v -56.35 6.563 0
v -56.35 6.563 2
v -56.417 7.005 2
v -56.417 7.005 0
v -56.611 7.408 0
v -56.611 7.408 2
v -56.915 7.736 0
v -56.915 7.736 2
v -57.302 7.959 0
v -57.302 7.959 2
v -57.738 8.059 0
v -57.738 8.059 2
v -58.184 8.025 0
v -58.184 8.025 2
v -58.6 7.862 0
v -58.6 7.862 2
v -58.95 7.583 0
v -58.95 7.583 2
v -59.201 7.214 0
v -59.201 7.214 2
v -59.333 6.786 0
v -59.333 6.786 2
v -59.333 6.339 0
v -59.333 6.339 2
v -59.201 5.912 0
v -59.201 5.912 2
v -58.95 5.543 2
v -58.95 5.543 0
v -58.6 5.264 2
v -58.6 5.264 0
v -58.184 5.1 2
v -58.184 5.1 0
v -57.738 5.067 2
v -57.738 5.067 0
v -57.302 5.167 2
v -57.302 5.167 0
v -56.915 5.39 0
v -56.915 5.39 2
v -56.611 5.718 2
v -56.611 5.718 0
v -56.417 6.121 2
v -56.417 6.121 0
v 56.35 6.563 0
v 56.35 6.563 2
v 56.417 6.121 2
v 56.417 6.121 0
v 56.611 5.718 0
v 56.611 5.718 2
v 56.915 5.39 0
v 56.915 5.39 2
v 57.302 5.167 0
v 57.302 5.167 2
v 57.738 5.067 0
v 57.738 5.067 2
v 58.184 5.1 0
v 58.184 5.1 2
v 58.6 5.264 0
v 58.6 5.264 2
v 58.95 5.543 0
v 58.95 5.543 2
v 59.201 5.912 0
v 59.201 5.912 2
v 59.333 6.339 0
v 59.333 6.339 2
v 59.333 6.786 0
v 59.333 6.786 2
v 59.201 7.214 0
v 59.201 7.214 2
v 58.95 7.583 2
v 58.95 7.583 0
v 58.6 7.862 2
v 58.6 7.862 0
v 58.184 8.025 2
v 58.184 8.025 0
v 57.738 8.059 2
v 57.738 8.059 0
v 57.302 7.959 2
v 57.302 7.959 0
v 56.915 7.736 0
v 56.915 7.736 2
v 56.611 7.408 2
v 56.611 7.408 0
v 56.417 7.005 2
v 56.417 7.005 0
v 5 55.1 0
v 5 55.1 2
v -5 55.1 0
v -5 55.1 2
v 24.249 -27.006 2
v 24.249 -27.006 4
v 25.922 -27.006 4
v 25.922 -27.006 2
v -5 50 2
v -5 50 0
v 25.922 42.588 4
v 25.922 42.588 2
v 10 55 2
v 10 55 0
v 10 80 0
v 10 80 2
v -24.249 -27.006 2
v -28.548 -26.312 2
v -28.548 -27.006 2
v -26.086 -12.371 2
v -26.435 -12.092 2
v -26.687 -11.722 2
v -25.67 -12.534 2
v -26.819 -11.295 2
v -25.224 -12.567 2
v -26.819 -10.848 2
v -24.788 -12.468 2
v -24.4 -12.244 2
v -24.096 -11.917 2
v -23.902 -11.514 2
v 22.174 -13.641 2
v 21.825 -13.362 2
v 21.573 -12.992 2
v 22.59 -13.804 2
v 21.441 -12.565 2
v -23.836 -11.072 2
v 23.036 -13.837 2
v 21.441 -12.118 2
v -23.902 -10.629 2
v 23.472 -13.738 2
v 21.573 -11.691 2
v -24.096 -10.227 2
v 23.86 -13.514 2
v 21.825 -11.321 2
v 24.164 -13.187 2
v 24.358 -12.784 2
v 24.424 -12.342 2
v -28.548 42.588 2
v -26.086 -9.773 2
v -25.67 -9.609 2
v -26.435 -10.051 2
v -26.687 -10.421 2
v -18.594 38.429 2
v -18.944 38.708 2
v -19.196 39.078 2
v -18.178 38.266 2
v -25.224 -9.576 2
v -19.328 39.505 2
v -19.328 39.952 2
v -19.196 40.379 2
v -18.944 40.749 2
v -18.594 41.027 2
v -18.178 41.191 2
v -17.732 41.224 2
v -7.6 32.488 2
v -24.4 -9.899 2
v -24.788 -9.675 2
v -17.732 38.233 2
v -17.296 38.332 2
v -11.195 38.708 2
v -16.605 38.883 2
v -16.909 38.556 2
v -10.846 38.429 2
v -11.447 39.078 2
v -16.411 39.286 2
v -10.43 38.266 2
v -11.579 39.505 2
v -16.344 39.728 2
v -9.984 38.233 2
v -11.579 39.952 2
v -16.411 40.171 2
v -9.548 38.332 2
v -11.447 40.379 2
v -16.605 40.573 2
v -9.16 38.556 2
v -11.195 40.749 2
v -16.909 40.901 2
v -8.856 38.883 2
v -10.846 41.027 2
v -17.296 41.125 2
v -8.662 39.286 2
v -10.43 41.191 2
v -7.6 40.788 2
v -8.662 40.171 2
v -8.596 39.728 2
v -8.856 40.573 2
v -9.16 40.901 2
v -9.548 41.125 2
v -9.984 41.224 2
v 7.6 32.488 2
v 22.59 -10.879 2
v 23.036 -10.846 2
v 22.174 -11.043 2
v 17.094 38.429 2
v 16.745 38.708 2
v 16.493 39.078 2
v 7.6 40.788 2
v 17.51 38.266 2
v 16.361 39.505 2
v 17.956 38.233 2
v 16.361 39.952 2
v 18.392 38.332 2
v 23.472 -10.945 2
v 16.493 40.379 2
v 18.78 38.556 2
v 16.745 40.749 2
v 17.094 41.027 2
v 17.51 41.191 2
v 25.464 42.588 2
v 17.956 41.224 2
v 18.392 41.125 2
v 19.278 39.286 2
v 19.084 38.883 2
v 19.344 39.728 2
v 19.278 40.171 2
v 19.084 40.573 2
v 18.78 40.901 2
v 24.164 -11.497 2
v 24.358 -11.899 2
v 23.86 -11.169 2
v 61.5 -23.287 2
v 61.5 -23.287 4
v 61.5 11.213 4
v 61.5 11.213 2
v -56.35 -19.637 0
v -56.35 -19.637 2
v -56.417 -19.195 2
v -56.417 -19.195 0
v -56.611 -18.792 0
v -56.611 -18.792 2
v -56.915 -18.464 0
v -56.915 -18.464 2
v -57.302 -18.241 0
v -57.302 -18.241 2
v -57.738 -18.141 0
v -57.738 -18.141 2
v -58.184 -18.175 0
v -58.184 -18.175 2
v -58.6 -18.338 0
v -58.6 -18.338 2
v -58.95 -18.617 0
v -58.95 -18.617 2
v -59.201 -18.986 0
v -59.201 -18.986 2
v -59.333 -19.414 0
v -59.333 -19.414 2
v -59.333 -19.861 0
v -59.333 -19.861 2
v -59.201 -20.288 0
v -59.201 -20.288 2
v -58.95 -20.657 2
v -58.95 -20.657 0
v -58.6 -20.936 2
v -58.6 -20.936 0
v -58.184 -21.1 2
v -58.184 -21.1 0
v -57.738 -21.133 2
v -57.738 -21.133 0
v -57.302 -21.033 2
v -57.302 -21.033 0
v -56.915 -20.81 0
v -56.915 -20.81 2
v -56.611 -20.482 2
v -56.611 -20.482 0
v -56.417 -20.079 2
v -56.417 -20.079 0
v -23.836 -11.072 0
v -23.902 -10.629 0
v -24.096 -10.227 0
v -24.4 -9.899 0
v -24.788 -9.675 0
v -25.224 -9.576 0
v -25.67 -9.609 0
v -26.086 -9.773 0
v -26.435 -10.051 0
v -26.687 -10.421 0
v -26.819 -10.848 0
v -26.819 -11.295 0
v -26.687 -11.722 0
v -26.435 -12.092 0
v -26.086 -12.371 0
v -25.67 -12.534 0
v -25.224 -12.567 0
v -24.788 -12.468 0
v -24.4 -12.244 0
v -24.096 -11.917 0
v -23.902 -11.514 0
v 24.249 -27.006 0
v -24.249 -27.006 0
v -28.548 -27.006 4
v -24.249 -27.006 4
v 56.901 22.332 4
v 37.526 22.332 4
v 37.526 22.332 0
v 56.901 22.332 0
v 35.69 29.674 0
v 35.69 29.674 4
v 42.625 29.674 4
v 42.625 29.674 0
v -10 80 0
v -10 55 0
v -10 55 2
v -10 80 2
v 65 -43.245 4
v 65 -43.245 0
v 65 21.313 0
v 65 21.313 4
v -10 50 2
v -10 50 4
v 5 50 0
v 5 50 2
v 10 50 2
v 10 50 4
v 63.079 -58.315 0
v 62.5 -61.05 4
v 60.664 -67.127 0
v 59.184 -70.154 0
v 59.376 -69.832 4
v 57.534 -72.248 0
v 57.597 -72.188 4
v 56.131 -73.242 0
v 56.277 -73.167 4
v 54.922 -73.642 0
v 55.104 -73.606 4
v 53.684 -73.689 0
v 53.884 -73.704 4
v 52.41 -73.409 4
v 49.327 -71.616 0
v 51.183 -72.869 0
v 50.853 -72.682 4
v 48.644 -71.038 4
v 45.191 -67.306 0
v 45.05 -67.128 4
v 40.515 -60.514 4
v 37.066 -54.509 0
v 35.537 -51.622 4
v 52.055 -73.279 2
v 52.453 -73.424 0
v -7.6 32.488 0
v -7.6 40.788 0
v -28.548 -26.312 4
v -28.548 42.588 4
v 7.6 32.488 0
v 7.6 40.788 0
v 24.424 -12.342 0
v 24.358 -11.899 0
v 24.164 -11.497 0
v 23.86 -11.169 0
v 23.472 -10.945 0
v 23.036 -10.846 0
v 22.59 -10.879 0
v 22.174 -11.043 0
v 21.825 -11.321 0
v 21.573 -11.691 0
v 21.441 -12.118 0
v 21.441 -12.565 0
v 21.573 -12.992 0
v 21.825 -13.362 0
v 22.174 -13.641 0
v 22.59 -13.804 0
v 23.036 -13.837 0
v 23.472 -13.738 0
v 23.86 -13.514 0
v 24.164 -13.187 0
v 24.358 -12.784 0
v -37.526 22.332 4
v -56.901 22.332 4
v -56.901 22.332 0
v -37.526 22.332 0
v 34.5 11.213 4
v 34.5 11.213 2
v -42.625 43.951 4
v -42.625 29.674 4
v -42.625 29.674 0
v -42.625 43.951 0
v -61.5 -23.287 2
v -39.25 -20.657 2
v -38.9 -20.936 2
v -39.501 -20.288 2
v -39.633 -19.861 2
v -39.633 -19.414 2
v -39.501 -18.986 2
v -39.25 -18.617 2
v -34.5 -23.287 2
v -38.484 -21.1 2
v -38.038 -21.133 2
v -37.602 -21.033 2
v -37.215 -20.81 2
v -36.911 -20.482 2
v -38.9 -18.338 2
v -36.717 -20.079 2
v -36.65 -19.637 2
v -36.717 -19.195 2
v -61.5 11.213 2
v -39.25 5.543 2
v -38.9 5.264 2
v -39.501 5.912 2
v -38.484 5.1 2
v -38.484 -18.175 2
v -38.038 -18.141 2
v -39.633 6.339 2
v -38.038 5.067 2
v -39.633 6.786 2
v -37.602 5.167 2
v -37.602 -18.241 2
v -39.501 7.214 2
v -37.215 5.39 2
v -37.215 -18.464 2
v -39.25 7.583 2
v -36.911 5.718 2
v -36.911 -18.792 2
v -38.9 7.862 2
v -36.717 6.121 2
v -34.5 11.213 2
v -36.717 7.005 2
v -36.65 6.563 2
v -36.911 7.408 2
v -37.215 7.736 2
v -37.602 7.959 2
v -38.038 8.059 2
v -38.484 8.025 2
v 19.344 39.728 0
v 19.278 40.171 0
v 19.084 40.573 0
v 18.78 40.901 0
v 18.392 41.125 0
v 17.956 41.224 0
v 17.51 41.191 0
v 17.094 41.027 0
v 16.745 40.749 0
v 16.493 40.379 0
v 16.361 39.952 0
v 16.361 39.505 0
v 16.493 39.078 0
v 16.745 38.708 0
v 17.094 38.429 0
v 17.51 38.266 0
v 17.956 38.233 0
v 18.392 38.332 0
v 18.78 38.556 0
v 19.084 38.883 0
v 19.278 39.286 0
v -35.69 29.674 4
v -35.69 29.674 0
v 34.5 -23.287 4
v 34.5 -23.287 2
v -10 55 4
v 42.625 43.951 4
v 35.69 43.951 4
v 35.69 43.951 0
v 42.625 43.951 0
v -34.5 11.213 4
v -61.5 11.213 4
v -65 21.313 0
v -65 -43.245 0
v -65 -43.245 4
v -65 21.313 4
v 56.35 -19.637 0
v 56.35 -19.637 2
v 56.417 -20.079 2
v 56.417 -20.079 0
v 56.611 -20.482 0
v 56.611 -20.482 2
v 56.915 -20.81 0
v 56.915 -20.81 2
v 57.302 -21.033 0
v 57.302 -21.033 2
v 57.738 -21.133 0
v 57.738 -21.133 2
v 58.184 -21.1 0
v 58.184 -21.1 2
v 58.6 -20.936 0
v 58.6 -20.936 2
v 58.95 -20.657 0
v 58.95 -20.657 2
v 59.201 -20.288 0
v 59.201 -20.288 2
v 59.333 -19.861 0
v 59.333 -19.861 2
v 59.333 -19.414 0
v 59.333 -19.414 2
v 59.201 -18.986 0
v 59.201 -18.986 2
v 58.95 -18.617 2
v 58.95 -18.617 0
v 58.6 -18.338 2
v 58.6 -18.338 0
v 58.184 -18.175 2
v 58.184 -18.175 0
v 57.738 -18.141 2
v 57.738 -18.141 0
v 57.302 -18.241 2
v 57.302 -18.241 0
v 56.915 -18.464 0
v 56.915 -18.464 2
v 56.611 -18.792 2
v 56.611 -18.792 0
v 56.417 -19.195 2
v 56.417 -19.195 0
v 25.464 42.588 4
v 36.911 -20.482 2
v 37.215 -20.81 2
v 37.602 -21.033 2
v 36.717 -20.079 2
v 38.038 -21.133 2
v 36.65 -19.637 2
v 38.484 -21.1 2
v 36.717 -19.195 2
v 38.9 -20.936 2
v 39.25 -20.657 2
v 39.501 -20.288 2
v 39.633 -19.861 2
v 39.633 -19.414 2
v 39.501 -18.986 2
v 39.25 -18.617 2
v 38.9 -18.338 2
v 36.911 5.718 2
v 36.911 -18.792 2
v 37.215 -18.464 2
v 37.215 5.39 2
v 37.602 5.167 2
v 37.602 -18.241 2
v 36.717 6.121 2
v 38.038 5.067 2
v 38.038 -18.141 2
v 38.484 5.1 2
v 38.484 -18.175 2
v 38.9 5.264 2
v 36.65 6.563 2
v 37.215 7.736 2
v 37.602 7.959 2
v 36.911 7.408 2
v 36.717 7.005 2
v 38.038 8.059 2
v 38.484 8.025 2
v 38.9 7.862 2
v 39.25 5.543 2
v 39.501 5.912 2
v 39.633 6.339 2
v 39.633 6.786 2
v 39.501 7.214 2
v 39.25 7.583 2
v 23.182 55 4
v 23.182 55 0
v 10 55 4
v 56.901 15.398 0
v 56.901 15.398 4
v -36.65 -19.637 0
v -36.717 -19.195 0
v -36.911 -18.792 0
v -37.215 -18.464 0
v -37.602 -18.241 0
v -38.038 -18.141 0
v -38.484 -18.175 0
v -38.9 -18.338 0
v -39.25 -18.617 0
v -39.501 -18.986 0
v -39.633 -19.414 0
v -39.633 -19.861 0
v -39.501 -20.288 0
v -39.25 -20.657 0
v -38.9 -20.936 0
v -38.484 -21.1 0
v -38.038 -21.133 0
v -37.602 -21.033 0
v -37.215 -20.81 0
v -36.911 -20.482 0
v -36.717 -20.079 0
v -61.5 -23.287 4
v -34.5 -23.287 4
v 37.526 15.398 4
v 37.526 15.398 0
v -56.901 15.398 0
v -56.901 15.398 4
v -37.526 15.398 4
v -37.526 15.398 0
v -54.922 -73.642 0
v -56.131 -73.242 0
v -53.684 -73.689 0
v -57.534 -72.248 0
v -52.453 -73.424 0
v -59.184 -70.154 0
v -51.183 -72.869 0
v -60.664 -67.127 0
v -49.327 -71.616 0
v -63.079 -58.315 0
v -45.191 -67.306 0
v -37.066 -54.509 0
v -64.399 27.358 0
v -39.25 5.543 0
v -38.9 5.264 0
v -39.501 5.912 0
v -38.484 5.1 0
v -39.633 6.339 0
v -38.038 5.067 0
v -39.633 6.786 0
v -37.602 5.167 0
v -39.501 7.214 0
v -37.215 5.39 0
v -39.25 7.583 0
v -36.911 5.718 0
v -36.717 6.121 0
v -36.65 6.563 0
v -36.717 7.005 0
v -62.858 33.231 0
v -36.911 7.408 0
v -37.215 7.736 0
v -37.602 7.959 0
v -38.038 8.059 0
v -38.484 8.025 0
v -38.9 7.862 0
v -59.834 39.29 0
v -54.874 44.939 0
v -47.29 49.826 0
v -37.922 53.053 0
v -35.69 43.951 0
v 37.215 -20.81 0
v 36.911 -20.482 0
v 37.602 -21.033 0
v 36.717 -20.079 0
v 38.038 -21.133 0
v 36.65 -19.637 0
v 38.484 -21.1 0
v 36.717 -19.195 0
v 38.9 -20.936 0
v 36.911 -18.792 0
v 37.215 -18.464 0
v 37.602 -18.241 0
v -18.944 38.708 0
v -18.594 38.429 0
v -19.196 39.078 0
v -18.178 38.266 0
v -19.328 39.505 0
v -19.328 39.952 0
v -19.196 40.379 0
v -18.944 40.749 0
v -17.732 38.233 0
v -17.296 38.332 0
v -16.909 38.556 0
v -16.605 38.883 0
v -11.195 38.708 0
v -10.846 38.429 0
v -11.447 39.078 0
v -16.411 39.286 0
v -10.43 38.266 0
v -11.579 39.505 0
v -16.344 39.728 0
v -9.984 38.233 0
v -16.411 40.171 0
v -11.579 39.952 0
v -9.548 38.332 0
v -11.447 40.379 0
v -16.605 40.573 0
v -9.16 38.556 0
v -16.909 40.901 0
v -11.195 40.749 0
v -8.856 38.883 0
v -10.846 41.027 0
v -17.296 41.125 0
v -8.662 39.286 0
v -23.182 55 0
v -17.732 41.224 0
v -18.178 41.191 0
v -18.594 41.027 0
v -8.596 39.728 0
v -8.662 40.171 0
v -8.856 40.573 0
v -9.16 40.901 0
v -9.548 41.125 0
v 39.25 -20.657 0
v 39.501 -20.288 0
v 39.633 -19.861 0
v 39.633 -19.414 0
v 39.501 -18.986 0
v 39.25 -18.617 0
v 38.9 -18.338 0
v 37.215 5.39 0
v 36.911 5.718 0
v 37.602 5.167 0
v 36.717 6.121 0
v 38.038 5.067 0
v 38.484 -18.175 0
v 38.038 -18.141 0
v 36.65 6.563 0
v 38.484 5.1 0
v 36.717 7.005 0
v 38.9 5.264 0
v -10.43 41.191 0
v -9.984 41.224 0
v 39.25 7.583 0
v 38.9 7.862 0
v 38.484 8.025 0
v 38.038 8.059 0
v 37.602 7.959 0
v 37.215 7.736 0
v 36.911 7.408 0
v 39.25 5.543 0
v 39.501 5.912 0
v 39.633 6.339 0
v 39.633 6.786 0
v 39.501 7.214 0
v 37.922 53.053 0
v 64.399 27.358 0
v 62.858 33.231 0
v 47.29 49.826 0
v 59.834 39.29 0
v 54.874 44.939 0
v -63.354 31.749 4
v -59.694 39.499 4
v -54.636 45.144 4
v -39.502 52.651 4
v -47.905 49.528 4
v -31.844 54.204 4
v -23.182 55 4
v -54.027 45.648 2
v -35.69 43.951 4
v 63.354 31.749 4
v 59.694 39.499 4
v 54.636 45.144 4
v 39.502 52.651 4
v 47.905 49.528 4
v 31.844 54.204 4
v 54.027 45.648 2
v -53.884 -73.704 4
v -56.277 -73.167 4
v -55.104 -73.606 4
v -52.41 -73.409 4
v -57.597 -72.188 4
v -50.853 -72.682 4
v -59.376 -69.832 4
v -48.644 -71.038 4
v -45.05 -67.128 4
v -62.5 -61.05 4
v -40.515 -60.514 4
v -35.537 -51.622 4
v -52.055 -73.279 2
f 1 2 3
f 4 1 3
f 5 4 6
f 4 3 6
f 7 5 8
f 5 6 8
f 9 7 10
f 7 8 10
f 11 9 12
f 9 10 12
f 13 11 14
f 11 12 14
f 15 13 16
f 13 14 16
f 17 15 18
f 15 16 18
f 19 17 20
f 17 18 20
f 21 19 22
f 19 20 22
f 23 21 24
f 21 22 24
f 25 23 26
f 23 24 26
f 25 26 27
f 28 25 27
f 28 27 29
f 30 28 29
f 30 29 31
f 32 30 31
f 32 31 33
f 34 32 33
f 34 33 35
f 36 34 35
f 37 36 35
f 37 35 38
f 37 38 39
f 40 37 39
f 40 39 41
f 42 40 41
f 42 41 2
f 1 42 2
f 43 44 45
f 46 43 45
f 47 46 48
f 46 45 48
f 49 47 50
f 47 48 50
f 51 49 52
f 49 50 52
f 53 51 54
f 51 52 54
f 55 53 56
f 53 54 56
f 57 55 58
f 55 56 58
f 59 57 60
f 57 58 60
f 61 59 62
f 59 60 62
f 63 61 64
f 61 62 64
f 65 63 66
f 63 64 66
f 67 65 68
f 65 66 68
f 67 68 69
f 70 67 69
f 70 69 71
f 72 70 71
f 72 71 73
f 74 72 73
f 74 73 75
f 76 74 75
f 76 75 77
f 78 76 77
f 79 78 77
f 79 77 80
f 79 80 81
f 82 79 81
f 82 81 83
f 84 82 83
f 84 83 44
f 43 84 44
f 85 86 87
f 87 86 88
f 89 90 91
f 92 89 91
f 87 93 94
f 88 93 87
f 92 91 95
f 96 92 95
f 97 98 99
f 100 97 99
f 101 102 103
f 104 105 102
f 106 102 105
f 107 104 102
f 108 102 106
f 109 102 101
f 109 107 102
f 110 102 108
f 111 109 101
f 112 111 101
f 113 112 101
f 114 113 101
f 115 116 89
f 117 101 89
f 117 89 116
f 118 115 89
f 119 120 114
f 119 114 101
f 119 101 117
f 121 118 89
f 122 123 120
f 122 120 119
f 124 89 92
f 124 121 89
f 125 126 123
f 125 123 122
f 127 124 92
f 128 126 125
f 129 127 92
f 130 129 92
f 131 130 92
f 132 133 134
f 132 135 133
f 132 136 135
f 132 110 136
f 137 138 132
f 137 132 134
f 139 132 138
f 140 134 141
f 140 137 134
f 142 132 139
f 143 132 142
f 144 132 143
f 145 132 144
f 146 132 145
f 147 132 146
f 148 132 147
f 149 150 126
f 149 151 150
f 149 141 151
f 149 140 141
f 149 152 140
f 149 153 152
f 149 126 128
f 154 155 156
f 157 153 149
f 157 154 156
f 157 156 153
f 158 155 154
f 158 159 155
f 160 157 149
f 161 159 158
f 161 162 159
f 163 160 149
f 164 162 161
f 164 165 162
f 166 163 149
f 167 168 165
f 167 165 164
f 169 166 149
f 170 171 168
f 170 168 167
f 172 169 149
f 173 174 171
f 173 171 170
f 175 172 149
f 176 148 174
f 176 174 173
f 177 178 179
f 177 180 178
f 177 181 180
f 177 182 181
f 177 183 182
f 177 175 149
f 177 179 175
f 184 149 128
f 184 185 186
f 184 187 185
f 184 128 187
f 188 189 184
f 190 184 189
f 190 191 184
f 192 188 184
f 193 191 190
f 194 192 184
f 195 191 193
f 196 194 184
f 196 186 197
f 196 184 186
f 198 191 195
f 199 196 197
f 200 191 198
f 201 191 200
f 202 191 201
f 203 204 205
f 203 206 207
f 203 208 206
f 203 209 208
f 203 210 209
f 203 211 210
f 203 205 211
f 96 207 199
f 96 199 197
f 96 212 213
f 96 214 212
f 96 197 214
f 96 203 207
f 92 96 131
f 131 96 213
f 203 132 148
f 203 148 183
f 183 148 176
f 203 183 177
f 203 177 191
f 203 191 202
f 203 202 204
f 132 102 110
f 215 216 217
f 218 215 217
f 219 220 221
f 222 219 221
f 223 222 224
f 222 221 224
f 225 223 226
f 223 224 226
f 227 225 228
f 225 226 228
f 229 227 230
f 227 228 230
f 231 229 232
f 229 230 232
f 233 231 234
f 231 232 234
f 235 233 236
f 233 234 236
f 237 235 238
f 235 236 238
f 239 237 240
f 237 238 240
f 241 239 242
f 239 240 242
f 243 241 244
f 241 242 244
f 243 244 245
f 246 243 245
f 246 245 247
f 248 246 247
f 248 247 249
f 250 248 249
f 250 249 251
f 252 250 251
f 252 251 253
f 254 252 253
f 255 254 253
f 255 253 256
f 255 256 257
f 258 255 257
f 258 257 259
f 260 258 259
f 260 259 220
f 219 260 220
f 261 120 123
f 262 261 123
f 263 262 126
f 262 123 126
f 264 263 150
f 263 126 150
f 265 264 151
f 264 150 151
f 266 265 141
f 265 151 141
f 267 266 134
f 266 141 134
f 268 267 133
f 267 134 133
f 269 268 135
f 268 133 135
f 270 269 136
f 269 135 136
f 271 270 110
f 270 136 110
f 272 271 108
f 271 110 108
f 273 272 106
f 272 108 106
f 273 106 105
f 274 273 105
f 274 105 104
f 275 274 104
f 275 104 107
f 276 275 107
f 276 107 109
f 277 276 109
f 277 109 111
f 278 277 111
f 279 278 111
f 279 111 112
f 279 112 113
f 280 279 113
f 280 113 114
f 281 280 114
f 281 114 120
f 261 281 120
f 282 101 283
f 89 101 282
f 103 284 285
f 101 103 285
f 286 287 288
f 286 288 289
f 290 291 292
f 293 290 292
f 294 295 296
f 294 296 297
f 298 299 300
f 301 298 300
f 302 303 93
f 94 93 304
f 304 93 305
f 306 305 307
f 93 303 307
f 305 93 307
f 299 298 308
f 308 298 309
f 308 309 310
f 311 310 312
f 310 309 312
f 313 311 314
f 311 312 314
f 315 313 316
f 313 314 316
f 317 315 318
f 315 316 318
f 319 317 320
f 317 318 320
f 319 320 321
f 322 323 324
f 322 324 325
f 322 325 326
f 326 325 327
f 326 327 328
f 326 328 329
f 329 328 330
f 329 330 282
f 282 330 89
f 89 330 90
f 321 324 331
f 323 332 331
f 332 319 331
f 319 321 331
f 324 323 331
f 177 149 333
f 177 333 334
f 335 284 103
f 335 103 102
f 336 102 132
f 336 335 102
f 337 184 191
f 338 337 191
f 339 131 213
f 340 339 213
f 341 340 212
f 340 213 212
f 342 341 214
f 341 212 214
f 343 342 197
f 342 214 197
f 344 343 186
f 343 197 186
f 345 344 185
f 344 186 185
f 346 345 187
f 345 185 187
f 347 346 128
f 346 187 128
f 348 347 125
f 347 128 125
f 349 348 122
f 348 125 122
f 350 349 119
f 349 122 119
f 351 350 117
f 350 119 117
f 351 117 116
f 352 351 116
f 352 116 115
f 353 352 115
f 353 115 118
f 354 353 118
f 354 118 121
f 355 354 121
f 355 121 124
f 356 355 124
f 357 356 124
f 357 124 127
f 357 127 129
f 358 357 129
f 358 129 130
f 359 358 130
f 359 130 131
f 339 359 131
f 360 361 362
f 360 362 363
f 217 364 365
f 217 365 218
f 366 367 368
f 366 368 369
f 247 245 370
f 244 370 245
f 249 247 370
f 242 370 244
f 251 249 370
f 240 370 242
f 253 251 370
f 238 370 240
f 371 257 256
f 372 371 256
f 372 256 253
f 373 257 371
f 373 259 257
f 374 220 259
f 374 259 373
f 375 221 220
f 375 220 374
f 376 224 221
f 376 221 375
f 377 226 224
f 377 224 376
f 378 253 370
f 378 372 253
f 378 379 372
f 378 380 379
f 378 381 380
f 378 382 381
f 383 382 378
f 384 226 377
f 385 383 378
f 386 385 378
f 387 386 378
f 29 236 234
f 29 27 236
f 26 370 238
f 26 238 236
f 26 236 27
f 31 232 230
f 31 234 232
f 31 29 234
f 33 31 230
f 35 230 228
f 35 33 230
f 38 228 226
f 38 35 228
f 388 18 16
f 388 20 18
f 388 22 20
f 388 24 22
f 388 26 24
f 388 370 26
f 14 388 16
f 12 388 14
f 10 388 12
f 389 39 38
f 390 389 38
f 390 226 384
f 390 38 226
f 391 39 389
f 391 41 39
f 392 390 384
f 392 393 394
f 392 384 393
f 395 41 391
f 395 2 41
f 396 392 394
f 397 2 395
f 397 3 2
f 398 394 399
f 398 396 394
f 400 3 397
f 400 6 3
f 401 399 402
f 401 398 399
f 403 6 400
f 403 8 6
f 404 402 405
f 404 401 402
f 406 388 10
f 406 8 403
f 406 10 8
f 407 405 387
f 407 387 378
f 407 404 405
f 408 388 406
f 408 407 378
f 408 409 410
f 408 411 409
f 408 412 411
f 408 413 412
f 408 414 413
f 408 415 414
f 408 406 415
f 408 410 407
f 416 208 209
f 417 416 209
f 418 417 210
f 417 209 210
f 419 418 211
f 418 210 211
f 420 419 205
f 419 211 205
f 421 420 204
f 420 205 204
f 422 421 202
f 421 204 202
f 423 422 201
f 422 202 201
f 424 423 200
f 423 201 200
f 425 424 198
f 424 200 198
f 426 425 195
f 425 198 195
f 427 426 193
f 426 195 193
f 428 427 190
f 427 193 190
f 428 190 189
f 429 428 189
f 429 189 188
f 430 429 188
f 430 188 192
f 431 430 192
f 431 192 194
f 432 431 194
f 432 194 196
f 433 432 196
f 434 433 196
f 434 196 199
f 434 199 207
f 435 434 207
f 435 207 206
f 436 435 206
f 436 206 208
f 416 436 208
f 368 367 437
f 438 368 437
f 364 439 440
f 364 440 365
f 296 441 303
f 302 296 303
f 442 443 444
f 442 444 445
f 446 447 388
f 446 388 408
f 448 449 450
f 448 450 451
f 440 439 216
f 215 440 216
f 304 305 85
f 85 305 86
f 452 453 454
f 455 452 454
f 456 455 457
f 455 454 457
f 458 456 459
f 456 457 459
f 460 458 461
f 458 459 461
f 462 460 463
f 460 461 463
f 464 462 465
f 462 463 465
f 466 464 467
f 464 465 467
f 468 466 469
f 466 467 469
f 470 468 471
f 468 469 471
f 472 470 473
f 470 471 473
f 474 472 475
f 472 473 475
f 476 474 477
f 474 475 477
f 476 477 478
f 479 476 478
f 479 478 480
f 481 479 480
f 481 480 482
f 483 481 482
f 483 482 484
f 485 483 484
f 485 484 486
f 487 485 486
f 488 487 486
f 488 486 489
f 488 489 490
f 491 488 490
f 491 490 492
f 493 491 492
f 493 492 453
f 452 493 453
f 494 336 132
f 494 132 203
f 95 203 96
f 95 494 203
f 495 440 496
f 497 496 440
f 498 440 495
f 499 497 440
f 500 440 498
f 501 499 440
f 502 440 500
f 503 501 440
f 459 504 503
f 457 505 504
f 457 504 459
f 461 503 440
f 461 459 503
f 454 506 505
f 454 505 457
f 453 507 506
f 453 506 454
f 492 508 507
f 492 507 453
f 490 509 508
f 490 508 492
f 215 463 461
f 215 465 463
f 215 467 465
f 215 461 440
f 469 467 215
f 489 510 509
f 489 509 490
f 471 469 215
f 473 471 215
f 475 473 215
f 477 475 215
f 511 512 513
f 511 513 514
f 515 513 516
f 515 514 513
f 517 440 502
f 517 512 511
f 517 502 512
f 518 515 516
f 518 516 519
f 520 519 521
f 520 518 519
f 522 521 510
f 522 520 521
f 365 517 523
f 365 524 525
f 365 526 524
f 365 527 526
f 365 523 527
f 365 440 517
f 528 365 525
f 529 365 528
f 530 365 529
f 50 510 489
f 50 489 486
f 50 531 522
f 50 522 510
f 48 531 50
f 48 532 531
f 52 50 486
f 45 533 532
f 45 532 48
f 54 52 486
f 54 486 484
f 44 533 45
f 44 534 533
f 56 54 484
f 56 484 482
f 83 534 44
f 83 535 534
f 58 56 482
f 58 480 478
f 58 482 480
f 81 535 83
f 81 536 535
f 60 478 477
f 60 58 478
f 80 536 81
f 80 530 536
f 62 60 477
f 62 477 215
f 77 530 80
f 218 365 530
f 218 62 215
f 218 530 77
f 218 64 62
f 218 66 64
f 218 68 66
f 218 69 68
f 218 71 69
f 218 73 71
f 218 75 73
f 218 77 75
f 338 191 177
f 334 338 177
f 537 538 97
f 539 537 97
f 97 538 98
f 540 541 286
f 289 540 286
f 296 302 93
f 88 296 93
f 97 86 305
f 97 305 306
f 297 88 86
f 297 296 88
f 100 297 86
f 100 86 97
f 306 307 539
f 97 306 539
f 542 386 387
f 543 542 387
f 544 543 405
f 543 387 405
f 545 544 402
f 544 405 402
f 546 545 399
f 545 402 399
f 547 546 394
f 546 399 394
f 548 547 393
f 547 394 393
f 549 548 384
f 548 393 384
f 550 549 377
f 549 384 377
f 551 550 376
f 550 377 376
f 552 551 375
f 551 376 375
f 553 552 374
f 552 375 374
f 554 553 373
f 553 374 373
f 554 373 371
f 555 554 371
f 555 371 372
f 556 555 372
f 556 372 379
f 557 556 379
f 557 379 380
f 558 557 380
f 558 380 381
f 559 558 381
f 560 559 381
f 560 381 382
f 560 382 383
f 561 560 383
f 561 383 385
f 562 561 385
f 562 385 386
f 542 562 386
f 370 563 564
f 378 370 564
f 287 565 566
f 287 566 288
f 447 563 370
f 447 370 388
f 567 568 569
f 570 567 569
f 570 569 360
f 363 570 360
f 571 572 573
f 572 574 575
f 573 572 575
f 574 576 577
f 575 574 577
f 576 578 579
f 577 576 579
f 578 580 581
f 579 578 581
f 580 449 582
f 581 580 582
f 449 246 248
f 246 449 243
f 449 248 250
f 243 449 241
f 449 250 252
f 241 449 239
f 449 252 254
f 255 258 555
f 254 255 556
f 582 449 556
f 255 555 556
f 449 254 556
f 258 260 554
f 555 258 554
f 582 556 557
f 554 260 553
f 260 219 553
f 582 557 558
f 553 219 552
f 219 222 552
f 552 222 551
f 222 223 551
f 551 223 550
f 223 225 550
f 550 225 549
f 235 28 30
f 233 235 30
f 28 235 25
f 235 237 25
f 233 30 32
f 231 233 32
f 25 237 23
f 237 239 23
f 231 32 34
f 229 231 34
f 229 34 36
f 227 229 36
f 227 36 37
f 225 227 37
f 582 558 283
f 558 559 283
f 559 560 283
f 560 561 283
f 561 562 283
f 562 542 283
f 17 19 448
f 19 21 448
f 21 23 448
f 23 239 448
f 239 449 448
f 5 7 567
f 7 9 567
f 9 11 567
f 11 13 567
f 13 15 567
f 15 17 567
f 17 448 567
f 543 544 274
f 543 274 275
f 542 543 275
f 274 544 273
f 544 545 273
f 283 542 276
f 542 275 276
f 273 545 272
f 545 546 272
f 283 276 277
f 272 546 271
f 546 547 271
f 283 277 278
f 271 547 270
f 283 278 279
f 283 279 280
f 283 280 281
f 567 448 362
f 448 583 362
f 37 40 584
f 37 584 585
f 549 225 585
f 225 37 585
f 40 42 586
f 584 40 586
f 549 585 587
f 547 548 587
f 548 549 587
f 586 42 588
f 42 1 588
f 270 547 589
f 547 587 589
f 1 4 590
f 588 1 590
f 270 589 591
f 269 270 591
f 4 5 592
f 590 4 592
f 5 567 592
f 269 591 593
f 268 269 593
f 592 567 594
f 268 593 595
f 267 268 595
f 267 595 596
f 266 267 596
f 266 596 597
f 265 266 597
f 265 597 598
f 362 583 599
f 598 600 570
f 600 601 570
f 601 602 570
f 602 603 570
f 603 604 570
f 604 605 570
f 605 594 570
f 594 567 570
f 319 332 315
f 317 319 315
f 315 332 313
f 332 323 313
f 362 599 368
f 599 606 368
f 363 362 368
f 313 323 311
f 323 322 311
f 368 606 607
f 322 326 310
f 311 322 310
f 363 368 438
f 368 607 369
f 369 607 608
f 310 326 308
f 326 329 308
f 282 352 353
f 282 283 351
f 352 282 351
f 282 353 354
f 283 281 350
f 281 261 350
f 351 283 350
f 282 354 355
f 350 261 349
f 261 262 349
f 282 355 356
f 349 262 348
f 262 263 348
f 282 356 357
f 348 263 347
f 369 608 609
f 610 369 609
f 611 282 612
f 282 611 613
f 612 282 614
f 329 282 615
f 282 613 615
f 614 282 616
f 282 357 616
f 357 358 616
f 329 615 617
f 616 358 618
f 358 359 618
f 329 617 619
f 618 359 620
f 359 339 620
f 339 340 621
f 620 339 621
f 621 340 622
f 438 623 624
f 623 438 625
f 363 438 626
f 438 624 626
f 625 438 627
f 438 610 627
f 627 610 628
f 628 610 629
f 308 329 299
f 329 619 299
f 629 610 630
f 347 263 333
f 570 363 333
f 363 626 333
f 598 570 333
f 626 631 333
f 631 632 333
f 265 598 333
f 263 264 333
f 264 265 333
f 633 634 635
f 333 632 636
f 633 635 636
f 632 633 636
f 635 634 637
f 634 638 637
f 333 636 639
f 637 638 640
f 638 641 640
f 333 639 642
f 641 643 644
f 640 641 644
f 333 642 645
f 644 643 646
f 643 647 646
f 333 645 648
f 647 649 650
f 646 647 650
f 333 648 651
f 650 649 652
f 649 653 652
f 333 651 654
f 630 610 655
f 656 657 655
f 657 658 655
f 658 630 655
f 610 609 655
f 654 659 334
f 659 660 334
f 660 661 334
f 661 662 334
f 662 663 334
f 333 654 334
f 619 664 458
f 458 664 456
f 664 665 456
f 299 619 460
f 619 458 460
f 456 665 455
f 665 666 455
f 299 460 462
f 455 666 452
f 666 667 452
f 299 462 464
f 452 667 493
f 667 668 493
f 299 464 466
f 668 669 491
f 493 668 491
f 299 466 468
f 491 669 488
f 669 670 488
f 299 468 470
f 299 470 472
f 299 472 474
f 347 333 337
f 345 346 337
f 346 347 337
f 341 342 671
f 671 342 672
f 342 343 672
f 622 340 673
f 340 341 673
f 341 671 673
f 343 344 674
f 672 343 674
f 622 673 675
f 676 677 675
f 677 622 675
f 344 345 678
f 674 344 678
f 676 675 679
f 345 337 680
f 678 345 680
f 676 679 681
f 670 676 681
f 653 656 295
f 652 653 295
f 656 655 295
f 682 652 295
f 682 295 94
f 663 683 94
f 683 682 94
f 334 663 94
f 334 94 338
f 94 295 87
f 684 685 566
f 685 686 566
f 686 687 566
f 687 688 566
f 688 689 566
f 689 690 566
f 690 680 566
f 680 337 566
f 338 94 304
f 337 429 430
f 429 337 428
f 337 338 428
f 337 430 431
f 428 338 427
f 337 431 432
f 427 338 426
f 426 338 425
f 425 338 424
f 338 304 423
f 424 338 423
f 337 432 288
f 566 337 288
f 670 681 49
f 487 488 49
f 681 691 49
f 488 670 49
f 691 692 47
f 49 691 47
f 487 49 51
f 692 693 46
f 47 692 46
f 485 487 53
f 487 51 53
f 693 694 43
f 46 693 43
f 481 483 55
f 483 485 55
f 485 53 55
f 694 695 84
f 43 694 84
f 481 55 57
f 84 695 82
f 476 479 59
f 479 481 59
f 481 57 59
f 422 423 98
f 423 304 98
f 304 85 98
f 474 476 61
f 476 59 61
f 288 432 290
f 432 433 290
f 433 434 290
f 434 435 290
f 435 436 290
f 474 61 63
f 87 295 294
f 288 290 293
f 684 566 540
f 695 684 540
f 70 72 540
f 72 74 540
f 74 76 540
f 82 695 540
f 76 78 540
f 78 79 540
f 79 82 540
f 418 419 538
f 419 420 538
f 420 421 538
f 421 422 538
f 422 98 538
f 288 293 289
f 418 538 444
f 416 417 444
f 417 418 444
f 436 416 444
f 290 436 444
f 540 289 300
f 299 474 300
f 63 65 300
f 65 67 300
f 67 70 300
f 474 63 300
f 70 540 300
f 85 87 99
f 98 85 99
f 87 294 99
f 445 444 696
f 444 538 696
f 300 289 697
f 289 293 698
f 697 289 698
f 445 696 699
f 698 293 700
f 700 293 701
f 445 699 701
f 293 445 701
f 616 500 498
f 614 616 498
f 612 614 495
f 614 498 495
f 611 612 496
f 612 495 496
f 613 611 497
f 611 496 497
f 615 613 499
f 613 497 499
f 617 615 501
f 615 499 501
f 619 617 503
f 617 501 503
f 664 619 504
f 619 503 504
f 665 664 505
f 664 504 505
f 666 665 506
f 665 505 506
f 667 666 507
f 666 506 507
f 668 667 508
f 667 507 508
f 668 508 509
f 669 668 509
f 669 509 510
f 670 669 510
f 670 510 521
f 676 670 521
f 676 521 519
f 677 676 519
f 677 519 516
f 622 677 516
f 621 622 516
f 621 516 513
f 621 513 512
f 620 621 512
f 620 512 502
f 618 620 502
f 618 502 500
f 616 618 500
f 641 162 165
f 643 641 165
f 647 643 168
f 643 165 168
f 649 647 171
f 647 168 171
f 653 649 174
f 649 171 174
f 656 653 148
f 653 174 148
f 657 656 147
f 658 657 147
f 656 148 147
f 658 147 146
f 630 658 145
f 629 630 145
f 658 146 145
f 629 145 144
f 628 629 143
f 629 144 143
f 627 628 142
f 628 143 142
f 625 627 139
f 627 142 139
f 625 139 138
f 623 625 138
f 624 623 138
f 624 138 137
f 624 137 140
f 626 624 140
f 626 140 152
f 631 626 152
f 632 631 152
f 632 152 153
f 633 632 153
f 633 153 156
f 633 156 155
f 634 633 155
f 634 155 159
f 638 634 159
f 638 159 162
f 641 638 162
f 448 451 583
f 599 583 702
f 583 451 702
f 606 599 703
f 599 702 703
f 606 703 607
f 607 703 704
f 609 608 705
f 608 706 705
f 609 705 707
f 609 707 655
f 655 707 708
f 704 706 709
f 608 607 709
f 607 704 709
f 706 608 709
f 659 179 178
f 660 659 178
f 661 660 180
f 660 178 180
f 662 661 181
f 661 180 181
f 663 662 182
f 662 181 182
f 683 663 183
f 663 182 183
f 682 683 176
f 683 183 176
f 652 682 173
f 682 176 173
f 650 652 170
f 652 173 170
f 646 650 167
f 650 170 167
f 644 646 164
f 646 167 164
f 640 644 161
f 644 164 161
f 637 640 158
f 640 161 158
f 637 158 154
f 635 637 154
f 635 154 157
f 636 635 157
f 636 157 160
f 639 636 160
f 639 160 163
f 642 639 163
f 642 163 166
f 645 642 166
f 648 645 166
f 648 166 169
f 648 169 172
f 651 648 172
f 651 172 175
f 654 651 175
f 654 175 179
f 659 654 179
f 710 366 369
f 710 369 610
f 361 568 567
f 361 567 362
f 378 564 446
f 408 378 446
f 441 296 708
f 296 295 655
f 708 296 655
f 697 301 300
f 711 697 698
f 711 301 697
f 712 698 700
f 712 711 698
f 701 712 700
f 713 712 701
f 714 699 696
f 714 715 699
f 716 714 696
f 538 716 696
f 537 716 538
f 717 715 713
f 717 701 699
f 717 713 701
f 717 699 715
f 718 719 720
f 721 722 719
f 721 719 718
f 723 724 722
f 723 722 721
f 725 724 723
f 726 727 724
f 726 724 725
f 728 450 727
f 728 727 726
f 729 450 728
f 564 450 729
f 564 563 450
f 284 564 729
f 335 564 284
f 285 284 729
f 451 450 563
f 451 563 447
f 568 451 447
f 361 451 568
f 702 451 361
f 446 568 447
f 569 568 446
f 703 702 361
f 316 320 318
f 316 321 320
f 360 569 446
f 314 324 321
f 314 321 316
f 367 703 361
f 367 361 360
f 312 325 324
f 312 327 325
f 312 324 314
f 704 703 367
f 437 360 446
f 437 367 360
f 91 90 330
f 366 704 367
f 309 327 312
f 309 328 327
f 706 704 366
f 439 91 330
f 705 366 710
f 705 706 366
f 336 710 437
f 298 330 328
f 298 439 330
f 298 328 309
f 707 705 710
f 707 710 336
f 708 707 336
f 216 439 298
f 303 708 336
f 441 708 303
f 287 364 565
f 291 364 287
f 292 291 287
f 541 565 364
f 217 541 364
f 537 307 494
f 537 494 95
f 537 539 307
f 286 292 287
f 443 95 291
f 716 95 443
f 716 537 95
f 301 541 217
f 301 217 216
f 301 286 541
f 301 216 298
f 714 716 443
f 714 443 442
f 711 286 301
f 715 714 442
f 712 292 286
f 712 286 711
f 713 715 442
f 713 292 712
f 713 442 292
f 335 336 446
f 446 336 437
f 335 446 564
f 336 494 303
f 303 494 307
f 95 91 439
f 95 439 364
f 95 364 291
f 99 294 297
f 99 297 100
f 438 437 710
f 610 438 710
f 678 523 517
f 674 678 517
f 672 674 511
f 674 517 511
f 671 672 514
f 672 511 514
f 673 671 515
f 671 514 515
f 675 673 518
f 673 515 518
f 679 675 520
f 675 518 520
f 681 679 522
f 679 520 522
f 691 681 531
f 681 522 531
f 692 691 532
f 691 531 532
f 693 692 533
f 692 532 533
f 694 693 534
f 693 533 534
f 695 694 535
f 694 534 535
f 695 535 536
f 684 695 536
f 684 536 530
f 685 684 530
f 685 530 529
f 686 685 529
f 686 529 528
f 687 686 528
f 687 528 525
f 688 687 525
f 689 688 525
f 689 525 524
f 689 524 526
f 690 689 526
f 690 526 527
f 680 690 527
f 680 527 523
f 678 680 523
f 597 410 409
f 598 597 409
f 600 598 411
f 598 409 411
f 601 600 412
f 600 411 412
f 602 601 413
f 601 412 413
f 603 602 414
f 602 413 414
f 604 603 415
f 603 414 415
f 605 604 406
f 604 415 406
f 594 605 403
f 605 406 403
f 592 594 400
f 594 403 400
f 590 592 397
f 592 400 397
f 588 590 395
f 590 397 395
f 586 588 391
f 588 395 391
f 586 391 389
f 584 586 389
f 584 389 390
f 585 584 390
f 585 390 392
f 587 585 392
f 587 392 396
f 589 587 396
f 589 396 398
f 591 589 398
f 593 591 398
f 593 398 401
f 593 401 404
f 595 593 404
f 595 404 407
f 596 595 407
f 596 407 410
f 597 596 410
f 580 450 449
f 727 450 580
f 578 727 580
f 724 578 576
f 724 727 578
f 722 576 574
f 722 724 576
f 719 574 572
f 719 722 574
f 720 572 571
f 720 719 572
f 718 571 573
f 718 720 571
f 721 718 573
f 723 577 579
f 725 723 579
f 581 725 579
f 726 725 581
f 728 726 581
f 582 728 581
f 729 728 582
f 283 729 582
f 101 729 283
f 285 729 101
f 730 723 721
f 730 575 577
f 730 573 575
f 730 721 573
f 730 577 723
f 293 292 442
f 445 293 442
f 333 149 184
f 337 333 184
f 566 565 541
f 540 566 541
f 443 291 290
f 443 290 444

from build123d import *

# Parameters (mm, degrees)
IZIM1_W                     = 130
IZIM1_H                     = 160
Y_KSEKLIK_EKSTR_ZYON1_DEPTH = 4
IZIM3_W                     = 55
IZIM3_H                     = 25
KES_EKSTR_ZYON1_DEPTH       = 4
KES_EKSTR_ZYON2_DEPTH       = 10
IZIM5_W                     = 54.012242348
IZIM5_H                     = 68.899562137
KES_EKSTR_ZYON3_DEPTH       = 2
IZIM8_W                     = 54.469692937
IZIM8_H                     = 69.59441616
KES_EKSTR_ZYON5_DEPTH       = 2
IZIM9_R                     = 1.5
KES_EKSTR_ZYON6_DEPTH       = 5
IZIM10_W                    = 27
IZIM10_H                    = 34.5
KES_EKSTR_ZYON7_DEPTH       = 2
IZIM11_R                    = 1.5
KES_EKSTR_ZYON8_DEPTH       = 5
KES_EKSTR_ZYON9_DEPTH       = 104.155222988
KES_EKSTR_ZYON9_DEPTH_BACK  = 5
KES_EKSTR_ZYON10_DEPTH      = 2
IZIM14_W                    = 5
IZIM14_H                    = 5.1
KES_EKSTR_ZYON11_DEPTH      = 9
IZIM15_W                    = 6.934142085
IZIM15_H                    = 14.276174882
IZIM15_W_2                  = 19.374808768
IZIM15_H_2                  = 6.934142085
KES_EKSTR_ZYON12_DEPTH      = 9
IZIM16_R                    = 1.5
KES_EKSTR_ZYON13_DEPTH      = 10
IZIM17_W                    = 7.6
IZIM17_H                    = 8.3
KES_EKSTR_ZYON14_DEPTH      = 10


with BuildPart() as part:
    # Çizim1 → Yükseklik-Ekstrüzyon1 (new body)
    with BuildSketch(Plane.XY):
        Rectangle(IZIM1_W, IZIM1_H)
    extrude(amount=Y_KSEKLIK_EKSTR_ZYON1_DEPTH)

    # Çizim3 → Kes-Ekstrüzyon1 (cut)
    with BuildSketch(Plane(origin=(0, 0, 0), x_dir=(-1, 0, 0), z_dir=(0, 0, -1))):
        with Locations((37.5, 67.5)):
            Rectangle(IZIM3_W, IZIM3_H)
        with Locations((-37.5, 67.5)):
            Rectangle(IZIM3_W, IZIM3_H)
    extrude(amount=-KES_EKSTR_ZYON1_DEPTH, mode=Mode.SUBTRACT)

    # Çizim4 → Kes-Ekstrüzyon2 (cut)
    with BuildSketch(Plane.XY.offset(4)):
        with BuildLine():
            Line((-24.249382275, -27.006425474), (24.249382275, -27.006425474))
            add(Edge.make_bspline(
                [(65, -43.244851104), (59.485167295, -111.431741319), (24.249382275, -27.006425474)],
                knots=[0, 0, 0, 1, 1, 1], degree=2))
            Line((65, -43.244851104), (65, -80))
            Line((65, -80), (-65, -80))
            Line((-65, -80), (-65, -43.244851104))
            add(Edge.make_bspline(
                [(-65, -43.244851104), (-59.485167295, -111.431741319), (-24.249382275, -27.006425474)],
                knots=[0, 0, 0, 1, 1, 1], degree=2))
        make_face()
    extrude(amount=-KES_EKSTR_ZYON2_DEPTH, mode=Mode.SUBTRACT)

    # Çizim5 → Kes-Ekstrüzyon3 (cut)
    with BuildSketch(Plane.XY.offset(4)):
        with Locations((-1.54185026, 8.138209618)):
            Rectangle(IZIM5_W, IZIM5_H)
    extrude(amount=-KES_EKSTR_ZYON3_DEPTH, mode=Mode.SUBTRACT)

    # Çizim8 → Kes-Ekstrüzyon5 (cut)
    with BuildSketch(Plane.XY.offset(4)):
        with Locations((-1.313124966, 7.790782606)):
            Rectangle(IZIM8_W, IZIM8_H)
    extrude(amount=-KES_EKSTR_ZYON5_DEPTH, mode=Mode.SUBTRACT)

    # Çizim9 → Kes-Ekstrüzyon6 (cut)
    with BuildSketch(Plane.XY.offset(4)):
        with Locations((-10.095729086, 39.728428549)):
            Circle(IZIM9_R)
        with Locations((17.844270914, 39.728428549)):
            Circle(IZIM9_R)
        with Locations((-25.335729086, -11.071571451)):
            Circle(IZIM9_R)
        with Locations((22.924270914, -12.341571451)):
            Circle(IZIM9_R)
    extrude(amount=-KES_EKSTR_ZYON6_DEPTH, mode=Mode.SUBTRACT)

    # Çizim10 → Kes-Ekstrüzyon7 (cut)
    with BuildSketch(Plane.XY.offset(4)):
        with Locations((-48, -6.037117551)):
            Rectangle(IZIM10_W, IZIM10_H)
        with Locations((48, -6.037117551)):
            Rectangle(IZIM10_W, IZIM10_H)
    extrude(amount=-KES_EKSTR_ZYON7_DEPTH, mode=Mode.SUBTRACT)

    # Çizim11 → Kes-Ekstrüzyon8 (cut)
    with BuildSketch(Plane.XY.offset(4)):
        with Locations((-57.85, -19.637117551)):
            Circle(IZIM11_R)
        with Locations((-38.15, -19.637117551)):
            Circle(IZIM11_R)
        with Locations((-38.15, 6.562882449)):
            Circle(IZIM11_R)
        with Locations((-57.85, 6.562882449)):
            Circle(IZIM11_R)
        with Locations(Location((57.85, -19.637117551, 0), (0, 0, 180))):
            Circle(IZIM11_R)
        with Locations(Location((38.15, -19.637117551, 0), (0, 0, 180))):
            Circle(IZIM11_R)
        with Locations(Location((38.15, 6.562882449, 0), (0, 0, 180))):
            Circle(IZIM11_R)
        with Locations(Location((57.85, 6.562882449, 0), (0, 0, 180))):
            Circle(IZIM11_R)
    extrude(amount=-KES_EKSTR_ZYON8_DEPTH, mode=Mode.SUBTRACT)

    # Çizim12 → Kes-Ekstrüzyon9 (cut, two sides)
    with BuildSketch(Plane.XY.offset(4)) as kes_ekstr_zyon9_sk:
        with BuildLine():
            Line((-65, 55), (-65, 21.312671553))
            add(Edge.make_bspline(
                [(-65, 21.312671553), (-63.962297288, 53.139320322), (-23.182224936, 55)],
                knots=[0, 0, 0, 0.889532369, 0.889532369, 0.889532369], degree=2))
            Line((-23.182224936, 55), (-65, 55))
        make_face()
        with BuildLine():
            add(Edge.make_bspline(
                [(65, 21.312671553), (63.962297288, 53.139320322), (23.182224936, 55)],
                knots=[0, 0, 0, 0.889532369, 0.889532369, 0.889532369], degree=2))
            Line((65, 21.312671553), (65, 55))
            Line((65, 55), (23.182224936, 55))
        make_face()
    extrude(amount=KES_EKSTR_ZYON9_DEPTH, mode=Mode.SUBTRACT)
    extrude(kes_ekstr_zyon9_sk.sketch, amount=-KES_EKSTR_ZYON9_DEPTH_BACK, mode=Mode.SUBTRACT)

    # Çizim13 → Kes-Ekstrüzyon10 (cut)
    with BuildSketch(Plane.XY.offset(4)):
        Polygon((0, 50), (0, 80), (-10, 80), (-10, 55), (-10, 50), align=None)
        Polygon((10, 80), (0, 80), (0, 50), (10, 50), (10, 55), align=None)
    extrude(amount=-KES_EKSTR_ZYON10_DEPTH, mode=Mode.SUBTRACT)

    # Çizim14 → Kes-Ekstrüzyon11 (cut)
    with BuildSketch(Plane.XY.offset(2)):
        with Locations((-2.5, 52.55)):
            Rectangle(IZIM14_W, IZIM14_H)
        with Locations((2.5, 52.55)):
            Rectangle(IZIM14_W, IZIM14_H)
    extrude(amount=-KES_EKSTR_ZYON11_DEPTH, mode=Mode.SUBTRACT)

    # Çizim15 → Kes-Ekstrüzyon12 (cut)
    with BuildSketch(Plane.XY.offset(4)):
        with Locations((-39.157508247, 36.812518567)):
            Rectangle(IZIM15_W, IZIM15_H)
        with Locations((-47.213349787, 18.865327288)):
            Rectangle(IZIM15_W_2, IZIM15_H_2)
        with Locations((39.157508247, 36.812518567)):
            Rectangle(IZIM15_W, IZIM15_H)
        with Locations((47.213349787, 18.865327288)):
            Rectangle(IZIM15_W_2, IZIM15_H_2)
    extrude(amount=-KES_EKSTR_ZYON12_DEPTH, mode=Mode.SUBTRACT)

    # Çizim16 → Kes-Ekstrüzyon13 (cut)
    with BuildSketch(Plane.XY.offset(2)):
        with Locations((-17.844270914, 39.728428549)):
            Circle(IZIM16_R)
    extrude(amount=-KES_EKSTR_ZYON13_DEPTH, mode=Mode.SUBTRACT)

    # Çizim17 → Kes-Ekstrüzyon14 (cut)
    with BuildSketch(Plane.XY.offset(2)):
        with Locations((-3.8, 36.638150808)):
            Rectangle(IZIM17_W, IZIM17_H)
        with Locations((3.8, 36.638150808)):
            Rectangle(IZIM17_W, IZIM17_H)
    extrude(amount=-KES_EKSTR_ZYON14_DEPTH, mode=Mode.SUBTRACT)


solid = part.part
